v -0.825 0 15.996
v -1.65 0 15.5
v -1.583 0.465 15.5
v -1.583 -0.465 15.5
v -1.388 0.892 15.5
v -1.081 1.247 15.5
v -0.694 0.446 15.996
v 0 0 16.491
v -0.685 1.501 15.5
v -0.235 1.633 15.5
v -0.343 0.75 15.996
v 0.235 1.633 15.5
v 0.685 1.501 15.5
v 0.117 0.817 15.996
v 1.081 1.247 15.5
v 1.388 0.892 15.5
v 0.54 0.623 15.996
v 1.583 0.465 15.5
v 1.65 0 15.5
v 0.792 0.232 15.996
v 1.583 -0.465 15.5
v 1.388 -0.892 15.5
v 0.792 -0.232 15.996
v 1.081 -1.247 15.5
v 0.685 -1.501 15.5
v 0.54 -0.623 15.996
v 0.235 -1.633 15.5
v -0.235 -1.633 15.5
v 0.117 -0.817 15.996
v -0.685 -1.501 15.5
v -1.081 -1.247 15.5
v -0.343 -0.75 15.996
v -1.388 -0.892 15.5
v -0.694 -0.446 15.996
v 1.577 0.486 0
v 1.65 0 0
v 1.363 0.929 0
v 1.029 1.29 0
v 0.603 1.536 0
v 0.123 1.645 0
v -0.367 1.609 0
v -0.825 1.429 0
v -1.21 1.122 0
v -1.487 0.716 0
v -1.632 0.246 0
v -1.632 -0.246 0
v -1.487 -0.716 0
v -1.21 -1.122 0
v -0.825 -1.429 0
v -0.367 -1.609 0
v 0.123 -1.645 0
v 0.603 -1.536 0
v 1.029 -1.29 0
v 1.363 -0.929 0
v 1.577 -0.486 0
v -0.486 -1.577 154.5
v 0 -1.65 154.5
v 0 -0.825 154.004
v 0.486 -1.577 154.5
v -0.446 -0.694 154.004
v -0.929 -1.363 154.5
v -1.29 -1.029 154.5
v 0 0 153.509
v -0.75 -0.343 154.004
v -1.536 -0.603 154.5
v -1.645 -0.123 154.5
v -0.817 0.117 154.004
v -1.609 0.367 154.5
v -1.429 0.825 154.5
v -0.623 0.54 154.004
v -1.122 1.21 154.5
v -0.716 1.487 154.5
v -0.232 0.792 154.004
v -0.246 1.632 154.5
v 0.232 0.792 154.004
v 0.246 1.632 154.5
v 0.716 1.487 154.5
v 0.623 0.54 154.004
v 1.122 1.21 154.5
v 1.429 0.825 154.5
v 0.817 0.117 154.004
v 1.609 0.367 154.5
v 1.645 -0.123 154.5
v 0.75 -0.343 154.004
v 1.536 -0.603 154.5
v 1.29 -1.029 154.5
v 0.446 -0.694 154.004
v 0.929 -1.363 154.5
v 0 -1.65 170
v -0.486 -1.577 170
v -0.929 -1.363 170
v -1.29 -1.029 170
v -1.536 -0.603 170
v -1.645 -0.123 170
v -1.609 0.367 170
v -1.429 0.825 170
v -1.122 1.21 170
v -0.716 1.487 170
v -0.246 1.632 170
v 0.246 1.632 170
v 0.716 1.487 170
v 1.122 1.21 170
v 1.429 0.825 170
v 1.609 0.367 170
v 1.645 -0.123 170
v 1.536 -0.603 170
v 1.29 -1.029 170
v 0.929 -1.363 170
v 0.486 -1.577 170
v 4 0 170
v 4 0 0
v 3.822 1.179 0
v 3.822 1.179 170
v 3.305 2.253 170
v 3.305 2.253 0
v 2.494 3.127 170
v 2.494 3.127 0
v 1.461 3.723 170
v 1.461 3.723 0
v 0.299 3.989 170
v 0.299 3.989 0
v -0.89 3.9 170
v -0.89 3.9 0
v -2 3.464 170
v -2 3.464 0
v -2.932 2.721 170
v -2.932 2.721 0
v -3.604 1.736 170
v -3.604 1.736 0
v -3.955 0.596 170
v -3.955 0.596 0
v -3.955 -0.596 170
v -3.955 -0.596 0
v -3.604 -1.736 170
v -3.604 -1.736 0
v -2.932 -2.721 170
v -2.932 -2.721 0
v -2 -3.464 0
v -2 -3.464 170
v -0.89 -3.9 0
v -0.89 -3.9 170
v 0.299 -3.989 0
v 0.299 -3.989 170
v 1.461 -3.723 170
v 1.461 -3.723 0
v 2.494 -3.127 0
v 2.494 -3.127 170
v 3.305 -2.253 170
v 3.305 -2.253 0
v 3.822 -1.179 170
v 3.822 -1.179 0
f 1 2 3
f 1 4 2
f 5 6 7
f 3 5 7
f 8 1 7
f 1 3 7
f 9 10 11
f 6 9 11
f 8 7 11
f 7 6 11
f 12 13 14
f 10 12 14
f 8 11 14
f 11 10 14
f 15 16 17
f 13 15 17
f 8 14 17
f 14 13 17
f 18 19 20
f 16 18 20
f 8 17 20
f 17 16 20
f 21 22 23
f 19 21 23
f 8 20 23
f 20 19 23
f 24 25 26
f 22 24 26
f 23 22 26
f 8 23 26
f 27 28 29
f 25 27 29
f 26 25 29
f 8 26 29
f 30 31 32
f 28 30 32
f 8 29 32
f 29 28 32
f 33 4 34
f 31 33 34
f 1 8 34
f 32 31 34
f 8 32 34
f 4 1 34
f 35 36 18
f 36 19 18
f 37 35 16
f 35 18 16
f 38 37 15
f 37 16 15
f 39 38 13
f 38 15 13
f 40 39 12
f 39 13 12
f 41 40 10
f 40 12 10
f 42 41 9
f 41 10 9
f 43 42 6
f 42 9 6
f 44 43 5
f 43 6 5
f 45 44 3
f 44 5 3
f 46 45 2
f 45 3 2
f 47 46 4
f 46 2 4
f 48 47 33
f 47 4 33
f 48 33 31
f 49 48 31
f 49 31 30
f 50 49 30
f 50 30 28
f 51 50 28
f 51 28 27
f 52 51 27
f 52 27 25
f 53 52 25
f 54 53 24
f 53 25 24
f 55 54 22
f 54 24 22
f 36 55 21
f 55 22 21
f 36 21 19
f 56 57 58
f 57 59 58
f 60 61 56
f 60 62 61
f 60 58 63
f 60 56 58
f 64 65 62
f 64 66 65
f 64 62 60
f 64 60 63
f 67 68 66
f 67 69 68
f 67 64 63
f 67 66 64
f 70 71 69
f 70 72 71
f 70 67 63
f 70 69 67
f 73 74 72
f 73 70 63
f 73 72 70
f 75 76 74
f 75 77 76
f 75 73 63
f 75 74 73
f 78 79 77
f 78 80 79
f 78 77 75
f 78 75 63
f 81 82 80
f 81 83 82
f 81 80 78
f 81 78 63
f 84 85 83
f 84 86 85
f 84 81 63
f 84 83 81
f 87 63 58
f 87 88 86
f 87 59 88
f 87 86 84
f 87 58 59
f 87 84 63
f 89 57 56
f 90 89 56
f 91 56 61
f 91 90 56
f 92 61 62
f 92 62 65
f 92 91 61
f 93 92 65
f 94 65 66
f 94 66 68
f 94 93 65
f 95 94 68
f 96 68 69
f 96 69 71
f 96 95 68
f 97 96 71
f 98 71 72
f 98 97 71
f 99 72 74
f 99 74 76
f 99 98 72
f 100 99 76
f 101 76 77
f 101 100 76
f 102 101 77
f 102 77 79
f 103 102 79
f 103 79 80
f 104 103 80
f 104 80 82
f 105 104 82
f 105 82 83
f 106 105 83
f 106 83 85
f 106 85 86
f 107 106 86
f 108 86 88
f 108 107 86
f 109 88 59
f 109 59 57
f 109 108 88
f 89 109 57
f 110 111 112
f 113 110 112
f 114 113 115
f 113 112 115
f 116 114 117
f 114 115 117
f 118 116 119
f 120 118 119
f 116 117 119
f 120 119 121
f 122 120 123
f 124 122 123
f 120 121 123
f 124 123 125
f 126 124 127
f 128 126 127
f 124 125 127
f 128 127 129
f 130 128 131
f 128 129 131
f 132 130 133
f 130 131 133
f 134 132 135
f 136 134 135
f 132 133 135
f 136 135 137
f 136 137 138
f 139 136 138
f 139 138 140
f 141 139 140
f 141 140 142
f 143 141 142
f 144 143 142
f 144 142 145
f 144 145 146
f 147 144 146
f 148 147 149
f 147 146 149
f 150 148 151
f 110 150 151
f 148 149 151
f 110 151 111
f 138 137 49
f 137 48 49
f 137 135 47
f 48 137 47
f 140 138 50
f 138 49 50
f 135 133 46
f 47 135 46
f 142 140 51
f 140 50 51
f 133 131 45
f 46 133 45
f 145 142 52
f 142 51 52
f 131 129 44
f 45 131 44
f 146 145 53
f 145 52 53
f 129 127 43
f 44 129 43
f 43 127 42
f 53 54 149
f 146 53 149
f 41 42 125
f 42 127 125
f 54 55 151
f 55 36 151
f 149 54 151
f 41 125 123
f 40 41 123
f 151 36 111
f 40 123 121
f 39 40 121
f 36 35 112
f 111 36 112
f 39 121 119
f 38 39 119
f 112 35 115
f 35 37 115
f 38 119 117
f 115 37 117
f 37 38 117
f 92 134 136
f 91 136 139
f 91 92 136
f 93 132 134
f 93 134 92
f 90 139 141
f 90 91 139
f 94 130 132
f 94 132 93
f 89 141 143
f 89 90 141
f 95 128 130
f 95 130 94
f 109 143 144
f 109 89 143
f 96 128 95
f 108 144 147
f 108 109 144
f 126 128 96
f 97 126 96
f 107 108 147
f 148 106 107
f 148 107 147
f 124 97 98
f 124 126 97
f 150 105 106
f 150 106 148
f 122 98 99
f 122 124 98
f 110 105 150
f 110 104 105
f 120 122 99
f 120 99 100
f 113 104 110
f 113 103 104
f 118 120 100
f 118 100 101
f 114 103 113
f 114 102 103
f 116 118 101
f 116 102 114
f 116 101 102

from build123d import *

# Parameters (mm, degrees)
SKETCH_1_R             = 4
EXTRUDE_1_DEPTH        = 170
HOLE_WIZARD_M4_2_D     = 3.3
HOLE_WIZARD_M4_2_DEPTH = 15.5
HOLE_WIZARD_M4_2_TIP   = 0.991420021


with BuildPart() as part:
    # 草图1 → 凸台-拉伸1 (new body)
    with BuildSketch(Plane.XY):
        Circle(SKETCH_1_R)
    extrude(amount=EXTRUDE_1_DEPTH)

    # 草图5 → M4 螺纹孔1 (revolve, cut)
    with BuildSketch(Plane(origin=(0, 0, 170), x_dir=(0, -1, 0), z_dir=(1, 0, 0))):
        Polygon((0, 0), (0, 16.491420021), (1.65, 15.5), (1.65, 0), align=None)
    revolve(axis=Axis((0, 0, 176.35), (0, 0, -1)), mode=Mode.SUBTRACT)

    # M4 螺纹孔2
    with Locations(Plane(origin=(0, 0, 0), x_dir=(-1, 0, 0), z_dir=(0, 0, -1))):
        with Locations((0, 0)):
            Hole(HOLE_WIZARD_M4_2_D / 2, depth=HOLE_WIZARD_M4_2_DEPTH)
            with Locations((0, 0, -(HOLE_WIZARD_M4_2_DEPTH + HOLE_WIZARD_M4_2_TIP / 2))):  # 118° drill point
                Cone(0, HOLE_WIZARD_M4_2_D / 2, HOLE_WIZARD_M4_2_TIP, mode=Mode.SUBTRACT)


solid = part.part
